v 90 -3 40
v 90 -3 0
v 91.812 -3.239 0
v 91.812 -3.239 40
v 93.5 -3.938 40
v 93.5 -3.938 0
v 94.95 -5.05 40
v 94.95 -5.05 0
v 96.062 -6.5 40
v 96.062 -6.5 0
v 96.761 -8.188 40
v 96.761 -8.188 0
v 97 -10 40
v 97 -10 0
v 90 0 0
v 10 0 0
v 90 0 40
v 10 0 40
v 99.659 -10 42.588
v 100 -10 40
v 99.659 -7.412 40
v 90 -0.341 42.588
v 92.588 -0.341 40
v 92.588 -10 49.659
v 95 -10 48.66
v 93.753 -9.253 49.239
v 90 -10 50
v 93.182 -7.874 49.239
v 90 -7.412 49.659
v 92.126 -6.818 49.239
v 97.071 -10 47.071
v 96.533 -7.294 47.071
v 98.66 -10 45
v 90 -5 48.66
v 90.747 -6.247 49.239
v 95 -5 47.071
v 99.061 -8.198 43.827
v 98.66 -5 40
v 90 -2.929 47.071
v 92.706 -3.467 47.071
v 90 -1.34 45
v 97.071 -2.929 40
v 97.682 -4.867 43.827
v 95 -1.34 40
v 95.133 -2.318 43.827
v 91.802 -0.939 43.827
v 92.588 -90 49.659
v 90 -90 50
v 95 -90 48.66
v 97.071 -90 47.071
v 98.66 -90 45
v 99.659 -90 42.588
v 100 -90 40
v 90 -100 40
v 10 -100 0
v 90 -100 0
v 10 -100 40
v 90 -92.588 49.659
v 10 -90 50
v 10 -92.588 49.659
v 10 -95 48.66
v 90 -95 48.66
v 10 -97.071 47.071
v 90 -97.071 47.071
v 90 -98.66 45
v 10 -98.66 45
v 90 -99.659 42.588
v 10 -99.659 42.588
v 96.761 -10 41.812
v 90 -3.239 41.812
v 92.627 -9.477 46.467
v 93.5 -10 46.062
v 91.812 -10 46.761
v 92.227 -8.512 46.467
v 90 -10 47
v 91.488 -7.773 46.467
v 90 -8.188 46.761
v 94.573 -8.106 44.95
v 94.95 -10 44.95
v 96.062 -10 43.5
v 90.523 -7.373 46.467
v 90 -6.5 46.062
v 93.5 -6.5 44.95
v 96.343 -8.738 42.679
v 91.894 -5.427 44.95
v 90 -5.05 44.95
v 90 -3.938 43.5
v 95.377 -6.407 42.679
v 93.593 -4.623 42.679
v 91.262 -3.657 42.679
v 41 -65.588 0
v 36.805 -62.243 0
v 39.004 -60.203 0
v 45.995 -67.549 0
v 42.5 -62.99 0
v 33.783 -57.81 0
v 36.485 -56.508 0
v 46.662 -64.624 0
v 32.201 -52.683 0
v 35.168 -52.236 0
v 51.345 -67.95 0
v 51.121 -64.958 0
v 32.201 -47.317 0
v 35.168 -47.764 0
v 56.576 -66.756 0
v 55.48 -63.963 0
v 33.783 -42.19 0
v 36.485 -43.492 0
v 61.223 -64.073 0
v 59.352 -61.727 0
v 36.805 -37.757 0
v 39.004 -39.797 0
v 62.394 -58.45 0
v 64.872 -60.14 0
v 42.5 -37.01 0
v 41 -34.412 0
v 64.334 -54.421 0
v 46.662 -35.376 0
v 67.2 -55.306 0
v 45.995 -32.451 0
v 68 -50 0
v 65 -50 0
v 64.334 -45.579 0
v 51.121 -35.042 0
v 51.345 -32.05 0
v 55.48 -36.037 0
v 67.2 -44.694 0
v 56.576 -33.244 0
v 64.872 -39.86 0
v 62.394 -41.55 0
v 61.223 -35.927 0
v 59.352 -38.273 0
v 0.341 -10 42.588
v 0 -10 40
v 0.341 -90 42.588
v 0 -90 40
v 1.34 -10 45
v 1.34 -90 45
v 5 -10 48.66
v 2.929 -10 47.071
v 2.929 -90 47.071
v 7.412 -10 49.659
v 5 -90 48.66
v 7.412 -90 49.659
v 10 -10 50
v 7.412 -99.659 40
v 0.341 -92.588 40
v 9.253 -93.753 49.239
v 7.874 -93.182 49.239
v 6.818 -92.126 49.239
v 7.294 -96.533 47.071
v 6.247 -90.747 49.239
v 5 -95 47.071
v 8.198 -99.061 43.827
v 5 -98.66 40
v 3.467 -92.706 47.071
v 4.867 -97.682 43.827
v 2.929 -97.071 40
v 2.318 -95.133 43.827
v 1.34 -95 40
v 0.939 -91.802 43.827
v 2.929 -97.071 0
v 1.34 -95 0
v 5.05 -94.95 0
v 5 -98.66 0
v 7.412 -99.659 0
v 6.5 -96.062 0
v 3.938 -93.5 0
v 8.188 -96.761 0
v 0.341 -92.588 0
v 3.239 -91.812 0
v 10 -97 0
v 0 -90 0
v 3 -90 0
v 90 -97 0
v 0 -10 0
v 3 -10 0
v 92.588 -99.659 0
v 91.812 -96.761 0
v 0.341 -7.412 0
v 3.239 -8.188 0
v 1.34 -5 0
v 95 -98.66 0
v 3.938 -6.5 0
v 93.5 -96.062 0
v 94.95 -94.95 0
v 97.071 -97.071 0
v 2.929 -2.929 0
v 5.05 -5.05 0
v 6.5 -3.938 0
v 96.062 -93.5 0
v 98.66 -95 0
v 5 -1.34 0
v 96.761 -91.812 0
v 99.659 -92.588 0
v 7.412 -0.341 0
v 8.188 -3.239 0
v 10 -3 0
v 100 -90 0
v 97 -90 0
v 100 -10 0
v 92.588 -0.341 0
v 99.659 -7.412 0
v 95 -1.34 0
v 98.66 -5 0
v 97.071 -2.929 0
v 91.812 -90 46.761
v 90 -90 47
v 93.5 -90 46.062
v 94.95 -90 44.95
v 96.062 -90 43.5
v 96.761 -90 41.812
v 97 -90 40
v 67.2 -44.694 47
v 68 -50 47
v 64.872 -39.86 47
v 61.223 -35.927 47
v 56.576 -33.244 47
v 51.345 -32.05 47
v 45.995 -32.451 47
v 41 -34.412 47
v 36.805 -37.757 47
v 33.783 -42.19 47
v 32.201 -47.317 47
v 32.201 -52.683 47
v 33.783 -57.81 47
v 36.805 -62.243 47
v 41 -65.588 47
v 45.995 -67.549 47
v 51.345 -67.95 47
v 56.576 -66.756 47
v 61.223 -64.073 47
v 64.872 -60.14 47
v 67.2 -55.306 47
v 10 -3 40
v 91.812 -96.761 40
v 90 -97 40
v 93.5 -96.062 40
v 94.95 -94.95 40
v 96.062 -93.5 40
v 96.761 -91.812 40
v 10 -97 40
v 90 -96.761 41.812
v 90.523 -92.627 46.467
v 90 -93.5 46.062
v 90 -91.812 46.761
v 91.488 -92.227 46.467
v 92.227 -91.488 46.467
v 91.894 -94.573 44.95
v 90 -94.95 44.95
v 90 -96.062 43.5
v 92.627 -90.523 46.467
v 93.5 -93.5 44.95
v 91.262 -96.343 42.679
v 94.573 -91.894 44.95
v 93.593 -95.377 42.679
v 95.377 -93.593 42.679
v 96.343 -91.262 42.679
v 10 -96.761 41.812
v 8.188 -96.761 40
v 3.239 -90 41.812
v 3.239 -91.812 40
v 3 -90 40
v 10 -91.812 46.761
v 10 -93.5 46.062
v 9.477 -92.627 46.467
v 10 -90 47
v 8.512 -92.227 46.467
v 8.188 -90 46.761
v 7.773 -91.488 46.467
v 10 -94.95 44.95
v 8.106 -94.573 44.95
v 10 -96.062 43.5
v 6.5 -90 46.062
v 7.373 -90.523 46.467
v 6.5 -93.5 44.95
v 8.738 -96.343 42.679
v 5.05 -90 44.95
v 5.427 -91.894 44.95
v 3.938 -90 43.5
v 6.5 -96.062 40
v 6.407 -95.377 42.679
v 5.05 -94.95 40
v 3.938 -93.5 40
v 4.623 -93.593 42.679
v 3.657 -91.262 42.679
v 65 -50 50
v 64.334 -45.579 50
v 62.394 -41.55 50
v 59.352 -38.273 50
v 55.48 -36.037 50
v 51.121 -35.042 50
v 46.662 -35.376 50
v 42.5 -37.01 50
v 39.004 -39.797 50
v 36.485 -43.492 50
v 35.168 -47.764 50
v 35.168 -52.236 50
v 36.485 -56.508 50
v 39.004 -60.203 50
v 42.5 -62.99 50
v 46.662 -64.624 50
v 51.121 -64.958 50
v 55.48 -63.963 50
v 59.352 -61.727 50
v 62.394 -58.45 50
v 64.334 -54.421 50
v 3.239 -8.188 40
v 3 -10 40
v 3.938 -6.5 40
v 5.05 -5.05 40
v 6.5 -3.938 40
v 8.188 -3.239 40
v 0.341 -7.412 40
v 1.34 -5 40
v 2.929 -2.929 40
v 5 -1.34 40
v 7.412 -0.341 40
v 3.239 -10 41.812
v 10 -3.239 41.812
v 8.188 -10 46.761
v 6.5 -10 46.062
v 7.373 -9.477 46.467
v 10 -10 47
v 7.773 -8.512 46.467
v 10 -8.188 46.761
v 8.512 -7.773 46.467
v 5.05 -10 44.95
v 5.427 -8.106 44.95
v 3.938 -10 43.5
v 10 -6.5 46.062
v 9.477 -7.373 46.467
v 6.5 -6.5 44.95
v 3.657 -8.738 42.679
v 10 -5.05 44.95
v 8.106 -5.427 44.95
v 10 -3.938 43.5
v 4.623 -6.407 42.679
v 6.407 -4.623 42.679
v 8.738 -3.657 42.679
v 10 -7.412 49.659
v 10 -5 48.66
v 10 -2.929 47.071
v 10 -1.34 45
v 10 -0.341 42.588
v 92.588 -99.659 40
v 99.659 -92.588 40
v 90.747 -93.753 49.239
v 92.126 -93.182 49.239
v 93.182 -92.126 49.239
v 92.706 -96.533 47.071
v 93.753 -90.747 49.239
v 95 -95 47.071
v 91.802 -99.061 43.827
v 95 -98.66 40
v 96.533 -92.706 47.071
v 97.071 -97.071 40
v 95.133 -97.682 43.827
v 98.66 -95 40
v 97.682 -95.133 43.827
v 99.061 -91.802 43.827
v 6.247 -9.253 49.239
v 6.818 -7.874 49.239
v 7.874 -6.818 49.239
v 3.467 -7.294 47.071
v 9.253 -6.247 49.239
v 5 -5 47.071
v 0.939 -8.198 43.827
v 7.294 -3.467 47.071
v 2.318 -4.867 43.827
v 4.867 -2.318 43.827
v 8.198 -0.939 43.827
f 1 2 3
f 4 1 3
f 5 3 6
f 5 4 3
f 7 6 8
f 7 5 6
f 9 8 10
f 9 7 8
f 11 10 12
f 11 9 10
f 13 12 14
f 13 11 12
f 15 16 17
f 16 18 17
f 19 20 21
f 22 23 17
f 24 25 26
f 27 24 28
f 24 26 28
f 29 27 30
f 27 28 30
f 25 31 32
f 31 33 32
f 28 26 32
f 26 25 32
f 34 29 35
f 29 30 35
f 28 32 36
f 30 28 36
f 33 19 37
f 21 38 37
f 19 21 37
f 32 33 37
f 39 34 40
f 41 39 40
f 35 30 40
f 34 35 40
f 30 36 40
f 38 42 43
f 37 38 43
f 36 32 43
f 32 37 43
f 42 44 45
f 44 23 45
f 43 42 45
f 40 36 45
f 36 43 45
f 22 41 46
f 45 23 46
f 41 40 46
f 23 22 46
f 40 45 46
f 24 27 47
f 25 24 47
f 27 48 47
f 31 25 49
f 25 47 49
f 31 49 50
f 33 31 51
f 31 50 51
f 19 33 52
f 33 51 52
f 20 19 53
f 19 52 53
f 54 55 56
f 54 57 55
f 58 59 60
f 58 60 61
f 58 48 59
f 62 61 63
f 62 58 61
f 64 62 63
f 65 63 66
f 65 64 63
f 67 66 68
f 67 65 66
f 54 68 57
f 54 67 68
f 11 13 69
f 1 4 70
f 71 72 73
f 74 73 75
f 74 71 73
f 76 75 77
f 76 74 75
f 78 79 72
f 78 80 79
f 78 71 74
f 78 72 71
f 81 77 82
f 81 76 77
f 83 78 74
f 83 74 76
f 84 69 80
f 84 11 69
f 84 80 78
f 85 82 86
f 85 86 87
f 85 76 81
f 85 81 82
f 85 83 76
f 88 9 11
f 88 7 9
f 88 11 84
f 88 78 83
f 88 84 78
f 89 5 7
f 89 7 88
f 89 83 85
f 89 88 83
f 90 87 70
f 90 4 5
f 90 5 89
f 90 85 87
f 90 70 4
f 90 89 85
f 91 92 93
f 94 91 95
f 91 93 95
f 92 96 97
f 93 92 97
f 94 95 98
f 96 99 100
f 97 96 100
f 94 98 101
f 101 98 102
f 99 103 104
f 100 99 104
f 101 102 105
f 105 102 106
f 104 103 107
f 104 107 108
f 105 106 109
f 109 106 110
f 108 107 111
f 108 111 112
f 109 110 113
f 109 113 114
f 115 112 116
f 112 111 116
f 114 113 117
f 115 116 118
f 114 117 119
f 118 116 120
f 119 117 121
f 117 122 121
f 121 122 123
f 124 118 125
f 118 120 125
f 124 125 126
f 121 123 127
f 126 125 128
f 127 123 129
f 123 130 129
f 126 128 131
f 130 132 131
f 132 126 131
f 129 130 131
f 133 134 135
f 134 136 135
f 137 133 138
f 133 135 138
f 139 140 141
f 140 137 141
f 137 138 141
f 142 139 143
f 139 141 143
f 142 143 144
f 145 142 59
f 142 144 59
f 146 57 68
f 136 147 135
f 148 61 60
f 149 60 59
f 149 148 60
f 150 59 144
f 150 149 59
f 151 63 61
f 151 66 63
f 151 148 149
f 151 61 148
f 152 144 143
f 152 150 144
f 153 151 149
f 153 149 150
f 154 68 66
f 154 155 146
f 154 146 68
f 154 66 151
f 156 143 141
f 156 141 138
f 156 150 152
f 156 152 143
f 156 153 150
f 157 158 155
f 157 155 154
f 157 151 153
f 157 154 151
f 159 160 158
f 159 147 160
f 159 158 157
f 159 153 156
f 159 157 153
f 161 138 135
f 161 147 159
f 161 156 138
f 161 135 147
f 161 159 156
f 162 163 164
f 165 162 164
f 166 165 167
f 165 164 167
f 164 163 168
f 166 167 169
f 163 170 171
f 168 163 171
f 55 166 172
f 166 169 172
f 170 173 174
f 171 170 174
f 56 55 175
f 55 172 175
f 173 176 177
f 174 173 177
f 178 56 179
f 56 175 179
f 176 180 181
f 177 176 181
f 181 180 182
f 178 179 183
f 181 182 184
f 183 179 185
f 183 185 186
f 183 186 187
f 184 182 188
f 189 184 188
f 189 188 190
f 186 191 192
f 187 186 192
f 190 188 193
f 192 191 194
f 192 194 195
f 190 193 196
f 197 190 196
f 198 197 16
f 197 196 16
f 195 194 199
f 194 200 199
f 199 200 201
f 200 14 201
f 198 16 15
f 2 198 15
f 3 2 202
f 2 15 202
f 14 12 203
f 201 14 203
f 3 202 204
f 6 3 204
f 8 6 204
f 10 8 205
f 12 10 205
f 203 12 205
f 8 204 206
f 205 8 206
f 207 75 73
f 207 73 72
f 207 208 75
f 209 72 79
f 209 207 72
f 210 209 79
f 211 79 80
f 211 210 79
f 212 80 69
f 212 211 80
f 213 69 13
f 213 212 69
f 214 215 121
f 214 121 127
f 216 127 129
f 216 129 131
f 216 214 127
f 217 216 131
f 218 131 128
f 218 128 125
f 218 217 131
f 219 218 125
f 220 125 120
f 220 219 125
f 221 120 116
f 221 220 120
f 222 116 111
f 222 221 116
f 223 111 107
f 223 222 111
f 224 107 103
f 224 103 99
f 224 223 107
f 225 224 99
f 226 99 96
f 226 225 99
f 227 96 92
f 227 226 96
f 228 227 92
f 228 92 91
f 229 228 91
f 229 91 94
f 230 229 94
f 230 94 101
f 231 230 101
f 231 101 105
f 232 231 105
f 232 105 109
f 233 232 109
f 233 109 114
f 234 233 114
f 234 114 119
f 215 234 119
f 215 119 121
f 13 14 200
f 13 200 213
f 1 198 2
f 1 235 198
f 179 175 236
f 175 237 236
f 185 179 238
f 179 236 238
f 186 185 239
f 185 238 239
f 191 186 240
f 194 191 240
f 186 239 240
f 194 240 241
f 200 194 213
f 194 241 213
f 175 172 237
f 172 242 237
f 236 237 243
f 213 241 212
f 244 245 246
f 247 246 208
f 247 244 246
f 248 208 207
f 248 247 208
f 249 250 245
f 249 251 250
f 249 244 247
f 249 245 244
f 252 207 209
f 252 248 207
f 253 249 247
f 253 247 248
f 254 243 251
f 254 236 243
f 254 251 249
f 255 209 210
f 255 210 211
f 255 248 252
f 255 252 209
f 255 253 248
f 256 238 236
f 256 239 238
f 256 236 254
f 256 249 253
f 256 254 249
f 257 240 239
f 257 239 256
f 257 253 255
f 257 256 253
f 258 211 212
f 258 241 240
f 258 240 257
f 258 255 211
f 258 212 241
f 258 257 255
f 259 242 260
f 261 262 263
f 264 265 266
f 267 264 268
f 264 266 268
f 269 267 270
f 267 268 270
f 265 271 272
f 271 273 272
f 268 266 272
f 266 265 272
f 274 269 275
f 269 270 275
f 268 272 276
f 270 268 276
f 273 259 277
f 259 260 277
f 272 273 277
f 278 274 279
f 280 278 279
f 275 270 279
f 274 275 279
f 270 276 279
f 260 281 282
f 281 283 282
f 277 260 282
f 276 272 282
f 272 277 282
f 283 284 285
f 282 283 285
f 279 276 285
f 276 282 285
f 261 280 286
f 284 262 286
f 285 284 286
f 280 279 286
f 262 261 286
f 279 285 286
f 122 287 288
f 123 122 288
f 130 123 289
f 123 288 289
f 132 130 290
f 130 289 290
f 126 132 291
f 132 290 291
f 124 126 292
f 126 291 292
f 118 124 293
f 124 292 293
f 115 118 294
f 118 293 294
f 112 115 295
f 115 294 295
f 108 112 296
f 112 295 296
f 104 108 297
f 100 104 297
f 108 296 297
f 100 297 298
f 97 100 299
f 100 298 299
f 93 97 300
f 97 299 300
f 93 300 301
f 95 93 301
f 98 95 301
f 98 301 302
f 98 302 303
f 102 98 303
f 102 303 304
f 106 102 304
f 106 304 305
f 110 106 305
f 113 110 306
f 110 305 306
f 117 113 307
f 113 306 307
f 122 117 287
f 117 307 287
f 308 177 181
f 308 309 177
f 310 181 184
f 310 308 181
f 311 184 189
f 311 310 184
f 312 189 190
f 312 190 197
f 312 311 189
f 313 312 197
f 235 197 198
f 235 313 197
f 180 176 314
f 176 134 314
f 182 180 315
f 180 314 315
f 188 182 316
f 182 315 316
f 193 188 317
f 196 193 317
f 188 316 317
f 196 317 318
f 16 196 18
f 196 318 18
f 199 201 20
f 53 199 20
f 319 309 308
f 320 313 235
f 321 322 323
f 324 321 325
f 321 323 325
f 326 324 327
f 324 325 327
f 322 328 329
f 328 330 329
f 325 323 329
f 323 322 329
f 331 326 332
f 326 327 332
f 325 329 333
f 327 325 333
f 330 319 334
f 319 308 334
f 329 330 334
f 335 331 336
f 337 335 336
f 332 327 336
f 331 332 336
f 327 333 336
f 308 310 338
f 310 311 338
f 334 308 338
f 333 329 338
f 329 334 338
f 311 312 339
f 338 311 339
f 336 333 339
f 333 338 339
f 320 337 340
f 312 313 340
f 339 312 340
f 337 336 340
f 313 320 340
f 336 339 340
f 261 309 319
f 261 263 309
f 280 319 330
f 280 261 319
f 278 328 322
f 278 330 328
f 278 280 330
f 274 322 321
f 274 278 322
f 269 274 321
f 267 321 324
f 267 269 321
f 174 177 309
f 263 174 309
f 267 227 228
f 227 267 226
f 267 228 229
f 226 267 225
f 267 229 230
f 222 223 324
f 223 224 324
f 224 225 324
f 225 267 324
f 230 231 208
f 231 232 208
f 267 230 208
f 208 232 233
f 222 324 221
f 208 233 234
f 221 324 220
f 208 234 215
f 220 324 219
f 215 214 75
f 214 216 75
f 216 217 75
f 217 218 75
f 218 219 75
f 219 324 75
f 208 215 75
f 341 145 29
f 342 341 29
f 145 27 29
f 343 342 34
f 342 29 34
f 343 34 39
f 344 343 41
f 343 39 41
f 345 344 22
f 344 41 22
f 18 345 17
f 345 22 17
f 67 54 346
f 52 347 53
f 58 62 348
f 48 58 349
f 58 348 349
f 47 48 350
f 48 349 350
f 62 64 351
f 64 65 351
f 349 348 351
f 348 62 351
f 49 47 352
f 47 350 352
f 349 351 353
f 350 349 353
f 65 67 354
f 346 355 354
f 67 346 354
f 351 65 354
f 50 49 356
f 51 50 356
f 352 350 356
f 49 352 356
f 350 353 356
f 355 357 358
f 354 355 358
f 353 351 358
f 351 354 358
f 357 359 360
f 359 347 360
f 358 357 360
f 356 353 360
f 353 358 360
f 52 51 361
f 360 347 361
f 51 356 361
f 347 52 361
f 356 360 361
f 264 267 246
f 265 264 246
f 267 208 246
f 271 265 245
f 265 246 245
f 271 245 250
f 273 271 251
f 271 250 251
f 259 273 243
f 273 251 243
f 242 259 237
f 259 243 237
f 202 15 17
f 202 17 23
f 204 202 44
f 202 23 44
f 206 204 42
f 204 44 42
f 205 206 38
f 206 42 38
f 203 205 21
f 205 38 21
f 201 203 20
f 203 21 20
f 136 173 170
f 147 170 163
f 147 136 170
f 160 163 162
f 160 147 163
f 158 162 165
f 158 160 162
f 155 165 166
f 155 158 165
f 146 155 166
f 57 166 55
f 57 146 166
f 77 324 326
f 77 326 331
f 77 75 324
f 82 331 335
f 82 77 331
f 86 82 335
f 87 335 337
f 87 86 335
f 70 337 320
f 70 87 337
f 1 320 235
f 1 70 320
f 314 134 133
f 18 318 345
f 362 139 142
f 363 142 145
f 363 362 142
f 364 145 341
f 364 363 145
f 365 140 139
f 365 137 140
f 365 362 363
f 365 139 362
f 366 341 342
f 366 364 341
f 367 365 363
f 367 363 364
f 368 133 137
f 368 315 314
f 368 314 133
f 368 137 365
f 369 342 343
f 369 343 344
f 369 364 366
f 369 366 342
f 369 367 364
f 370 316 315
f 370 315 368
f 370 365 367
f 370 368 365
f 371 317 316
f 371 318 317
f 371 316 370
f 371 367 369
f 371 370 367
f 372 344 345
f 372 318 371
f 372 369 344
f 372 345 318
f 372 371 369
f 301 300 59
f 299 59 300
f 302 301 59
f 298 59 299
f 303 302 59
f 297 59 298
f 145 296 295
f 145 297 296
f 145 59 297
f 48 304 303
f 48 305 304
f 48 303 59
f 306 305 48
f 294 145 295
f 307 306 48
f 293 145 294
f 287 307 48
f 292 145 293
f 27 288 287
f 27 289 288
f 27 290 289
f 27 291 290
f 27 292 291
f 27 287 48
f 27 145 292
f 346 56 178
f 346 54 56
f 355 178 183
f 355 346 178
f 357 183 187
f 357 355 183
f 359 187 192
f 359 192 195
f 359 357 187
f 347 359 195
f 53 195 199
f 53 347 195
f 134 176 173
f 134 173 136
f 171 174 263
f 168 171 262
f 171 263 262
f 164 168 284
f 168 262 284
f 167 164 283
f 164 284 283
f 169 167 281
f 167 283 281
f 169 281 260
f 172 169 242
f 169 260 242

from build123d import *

# Parameters (mm, degrees)
F0_W     = 100
F0_H     = 50
F1_DEPTH = 100
F2_R     = 15
F3_DEPTH = 50
F4_R     = 10
F5_T     = -3


with BuildPart() as f1:
    # F0 (on Front) → F1 (new body)
    with BuildSketch(Plane.XZ):
        with Locations((50, 25)):
            Rectangle(F0_W, F0_H)
    extrude(amount=F1_DEPTH)

    # F2 (on face) → F3 (cut, through all)
    with BuildSketch(Plane.XY.offset(50)):
        with Locations((50, -50)):
            Circle(F2_R)
    extrude(amount=-F3_DEPTH, mode=Mode.SUBTRACT)

    # F4
    f4_edges = [f1.edges().sort_by_distance(p)[0] for p in [
        (100, 0, 25),
        (0, 0, 25),
        (100, -100, 25),
        (0, -100, 25),
        (50, -100, 50),
        (0, -50, 50),
        (100, -50, 50),
        (50, 0, 50),
    ]]
    fillet(f4_edges, radius=F4_R)

    # F5
    f5_openings = [f1.faces().sort_by_distance(p)[0] for p in [
        (1.414214, -50, 0),
    ]]
    offset(amount=F5_T, openings=f5_openings)


solid = f1.part
